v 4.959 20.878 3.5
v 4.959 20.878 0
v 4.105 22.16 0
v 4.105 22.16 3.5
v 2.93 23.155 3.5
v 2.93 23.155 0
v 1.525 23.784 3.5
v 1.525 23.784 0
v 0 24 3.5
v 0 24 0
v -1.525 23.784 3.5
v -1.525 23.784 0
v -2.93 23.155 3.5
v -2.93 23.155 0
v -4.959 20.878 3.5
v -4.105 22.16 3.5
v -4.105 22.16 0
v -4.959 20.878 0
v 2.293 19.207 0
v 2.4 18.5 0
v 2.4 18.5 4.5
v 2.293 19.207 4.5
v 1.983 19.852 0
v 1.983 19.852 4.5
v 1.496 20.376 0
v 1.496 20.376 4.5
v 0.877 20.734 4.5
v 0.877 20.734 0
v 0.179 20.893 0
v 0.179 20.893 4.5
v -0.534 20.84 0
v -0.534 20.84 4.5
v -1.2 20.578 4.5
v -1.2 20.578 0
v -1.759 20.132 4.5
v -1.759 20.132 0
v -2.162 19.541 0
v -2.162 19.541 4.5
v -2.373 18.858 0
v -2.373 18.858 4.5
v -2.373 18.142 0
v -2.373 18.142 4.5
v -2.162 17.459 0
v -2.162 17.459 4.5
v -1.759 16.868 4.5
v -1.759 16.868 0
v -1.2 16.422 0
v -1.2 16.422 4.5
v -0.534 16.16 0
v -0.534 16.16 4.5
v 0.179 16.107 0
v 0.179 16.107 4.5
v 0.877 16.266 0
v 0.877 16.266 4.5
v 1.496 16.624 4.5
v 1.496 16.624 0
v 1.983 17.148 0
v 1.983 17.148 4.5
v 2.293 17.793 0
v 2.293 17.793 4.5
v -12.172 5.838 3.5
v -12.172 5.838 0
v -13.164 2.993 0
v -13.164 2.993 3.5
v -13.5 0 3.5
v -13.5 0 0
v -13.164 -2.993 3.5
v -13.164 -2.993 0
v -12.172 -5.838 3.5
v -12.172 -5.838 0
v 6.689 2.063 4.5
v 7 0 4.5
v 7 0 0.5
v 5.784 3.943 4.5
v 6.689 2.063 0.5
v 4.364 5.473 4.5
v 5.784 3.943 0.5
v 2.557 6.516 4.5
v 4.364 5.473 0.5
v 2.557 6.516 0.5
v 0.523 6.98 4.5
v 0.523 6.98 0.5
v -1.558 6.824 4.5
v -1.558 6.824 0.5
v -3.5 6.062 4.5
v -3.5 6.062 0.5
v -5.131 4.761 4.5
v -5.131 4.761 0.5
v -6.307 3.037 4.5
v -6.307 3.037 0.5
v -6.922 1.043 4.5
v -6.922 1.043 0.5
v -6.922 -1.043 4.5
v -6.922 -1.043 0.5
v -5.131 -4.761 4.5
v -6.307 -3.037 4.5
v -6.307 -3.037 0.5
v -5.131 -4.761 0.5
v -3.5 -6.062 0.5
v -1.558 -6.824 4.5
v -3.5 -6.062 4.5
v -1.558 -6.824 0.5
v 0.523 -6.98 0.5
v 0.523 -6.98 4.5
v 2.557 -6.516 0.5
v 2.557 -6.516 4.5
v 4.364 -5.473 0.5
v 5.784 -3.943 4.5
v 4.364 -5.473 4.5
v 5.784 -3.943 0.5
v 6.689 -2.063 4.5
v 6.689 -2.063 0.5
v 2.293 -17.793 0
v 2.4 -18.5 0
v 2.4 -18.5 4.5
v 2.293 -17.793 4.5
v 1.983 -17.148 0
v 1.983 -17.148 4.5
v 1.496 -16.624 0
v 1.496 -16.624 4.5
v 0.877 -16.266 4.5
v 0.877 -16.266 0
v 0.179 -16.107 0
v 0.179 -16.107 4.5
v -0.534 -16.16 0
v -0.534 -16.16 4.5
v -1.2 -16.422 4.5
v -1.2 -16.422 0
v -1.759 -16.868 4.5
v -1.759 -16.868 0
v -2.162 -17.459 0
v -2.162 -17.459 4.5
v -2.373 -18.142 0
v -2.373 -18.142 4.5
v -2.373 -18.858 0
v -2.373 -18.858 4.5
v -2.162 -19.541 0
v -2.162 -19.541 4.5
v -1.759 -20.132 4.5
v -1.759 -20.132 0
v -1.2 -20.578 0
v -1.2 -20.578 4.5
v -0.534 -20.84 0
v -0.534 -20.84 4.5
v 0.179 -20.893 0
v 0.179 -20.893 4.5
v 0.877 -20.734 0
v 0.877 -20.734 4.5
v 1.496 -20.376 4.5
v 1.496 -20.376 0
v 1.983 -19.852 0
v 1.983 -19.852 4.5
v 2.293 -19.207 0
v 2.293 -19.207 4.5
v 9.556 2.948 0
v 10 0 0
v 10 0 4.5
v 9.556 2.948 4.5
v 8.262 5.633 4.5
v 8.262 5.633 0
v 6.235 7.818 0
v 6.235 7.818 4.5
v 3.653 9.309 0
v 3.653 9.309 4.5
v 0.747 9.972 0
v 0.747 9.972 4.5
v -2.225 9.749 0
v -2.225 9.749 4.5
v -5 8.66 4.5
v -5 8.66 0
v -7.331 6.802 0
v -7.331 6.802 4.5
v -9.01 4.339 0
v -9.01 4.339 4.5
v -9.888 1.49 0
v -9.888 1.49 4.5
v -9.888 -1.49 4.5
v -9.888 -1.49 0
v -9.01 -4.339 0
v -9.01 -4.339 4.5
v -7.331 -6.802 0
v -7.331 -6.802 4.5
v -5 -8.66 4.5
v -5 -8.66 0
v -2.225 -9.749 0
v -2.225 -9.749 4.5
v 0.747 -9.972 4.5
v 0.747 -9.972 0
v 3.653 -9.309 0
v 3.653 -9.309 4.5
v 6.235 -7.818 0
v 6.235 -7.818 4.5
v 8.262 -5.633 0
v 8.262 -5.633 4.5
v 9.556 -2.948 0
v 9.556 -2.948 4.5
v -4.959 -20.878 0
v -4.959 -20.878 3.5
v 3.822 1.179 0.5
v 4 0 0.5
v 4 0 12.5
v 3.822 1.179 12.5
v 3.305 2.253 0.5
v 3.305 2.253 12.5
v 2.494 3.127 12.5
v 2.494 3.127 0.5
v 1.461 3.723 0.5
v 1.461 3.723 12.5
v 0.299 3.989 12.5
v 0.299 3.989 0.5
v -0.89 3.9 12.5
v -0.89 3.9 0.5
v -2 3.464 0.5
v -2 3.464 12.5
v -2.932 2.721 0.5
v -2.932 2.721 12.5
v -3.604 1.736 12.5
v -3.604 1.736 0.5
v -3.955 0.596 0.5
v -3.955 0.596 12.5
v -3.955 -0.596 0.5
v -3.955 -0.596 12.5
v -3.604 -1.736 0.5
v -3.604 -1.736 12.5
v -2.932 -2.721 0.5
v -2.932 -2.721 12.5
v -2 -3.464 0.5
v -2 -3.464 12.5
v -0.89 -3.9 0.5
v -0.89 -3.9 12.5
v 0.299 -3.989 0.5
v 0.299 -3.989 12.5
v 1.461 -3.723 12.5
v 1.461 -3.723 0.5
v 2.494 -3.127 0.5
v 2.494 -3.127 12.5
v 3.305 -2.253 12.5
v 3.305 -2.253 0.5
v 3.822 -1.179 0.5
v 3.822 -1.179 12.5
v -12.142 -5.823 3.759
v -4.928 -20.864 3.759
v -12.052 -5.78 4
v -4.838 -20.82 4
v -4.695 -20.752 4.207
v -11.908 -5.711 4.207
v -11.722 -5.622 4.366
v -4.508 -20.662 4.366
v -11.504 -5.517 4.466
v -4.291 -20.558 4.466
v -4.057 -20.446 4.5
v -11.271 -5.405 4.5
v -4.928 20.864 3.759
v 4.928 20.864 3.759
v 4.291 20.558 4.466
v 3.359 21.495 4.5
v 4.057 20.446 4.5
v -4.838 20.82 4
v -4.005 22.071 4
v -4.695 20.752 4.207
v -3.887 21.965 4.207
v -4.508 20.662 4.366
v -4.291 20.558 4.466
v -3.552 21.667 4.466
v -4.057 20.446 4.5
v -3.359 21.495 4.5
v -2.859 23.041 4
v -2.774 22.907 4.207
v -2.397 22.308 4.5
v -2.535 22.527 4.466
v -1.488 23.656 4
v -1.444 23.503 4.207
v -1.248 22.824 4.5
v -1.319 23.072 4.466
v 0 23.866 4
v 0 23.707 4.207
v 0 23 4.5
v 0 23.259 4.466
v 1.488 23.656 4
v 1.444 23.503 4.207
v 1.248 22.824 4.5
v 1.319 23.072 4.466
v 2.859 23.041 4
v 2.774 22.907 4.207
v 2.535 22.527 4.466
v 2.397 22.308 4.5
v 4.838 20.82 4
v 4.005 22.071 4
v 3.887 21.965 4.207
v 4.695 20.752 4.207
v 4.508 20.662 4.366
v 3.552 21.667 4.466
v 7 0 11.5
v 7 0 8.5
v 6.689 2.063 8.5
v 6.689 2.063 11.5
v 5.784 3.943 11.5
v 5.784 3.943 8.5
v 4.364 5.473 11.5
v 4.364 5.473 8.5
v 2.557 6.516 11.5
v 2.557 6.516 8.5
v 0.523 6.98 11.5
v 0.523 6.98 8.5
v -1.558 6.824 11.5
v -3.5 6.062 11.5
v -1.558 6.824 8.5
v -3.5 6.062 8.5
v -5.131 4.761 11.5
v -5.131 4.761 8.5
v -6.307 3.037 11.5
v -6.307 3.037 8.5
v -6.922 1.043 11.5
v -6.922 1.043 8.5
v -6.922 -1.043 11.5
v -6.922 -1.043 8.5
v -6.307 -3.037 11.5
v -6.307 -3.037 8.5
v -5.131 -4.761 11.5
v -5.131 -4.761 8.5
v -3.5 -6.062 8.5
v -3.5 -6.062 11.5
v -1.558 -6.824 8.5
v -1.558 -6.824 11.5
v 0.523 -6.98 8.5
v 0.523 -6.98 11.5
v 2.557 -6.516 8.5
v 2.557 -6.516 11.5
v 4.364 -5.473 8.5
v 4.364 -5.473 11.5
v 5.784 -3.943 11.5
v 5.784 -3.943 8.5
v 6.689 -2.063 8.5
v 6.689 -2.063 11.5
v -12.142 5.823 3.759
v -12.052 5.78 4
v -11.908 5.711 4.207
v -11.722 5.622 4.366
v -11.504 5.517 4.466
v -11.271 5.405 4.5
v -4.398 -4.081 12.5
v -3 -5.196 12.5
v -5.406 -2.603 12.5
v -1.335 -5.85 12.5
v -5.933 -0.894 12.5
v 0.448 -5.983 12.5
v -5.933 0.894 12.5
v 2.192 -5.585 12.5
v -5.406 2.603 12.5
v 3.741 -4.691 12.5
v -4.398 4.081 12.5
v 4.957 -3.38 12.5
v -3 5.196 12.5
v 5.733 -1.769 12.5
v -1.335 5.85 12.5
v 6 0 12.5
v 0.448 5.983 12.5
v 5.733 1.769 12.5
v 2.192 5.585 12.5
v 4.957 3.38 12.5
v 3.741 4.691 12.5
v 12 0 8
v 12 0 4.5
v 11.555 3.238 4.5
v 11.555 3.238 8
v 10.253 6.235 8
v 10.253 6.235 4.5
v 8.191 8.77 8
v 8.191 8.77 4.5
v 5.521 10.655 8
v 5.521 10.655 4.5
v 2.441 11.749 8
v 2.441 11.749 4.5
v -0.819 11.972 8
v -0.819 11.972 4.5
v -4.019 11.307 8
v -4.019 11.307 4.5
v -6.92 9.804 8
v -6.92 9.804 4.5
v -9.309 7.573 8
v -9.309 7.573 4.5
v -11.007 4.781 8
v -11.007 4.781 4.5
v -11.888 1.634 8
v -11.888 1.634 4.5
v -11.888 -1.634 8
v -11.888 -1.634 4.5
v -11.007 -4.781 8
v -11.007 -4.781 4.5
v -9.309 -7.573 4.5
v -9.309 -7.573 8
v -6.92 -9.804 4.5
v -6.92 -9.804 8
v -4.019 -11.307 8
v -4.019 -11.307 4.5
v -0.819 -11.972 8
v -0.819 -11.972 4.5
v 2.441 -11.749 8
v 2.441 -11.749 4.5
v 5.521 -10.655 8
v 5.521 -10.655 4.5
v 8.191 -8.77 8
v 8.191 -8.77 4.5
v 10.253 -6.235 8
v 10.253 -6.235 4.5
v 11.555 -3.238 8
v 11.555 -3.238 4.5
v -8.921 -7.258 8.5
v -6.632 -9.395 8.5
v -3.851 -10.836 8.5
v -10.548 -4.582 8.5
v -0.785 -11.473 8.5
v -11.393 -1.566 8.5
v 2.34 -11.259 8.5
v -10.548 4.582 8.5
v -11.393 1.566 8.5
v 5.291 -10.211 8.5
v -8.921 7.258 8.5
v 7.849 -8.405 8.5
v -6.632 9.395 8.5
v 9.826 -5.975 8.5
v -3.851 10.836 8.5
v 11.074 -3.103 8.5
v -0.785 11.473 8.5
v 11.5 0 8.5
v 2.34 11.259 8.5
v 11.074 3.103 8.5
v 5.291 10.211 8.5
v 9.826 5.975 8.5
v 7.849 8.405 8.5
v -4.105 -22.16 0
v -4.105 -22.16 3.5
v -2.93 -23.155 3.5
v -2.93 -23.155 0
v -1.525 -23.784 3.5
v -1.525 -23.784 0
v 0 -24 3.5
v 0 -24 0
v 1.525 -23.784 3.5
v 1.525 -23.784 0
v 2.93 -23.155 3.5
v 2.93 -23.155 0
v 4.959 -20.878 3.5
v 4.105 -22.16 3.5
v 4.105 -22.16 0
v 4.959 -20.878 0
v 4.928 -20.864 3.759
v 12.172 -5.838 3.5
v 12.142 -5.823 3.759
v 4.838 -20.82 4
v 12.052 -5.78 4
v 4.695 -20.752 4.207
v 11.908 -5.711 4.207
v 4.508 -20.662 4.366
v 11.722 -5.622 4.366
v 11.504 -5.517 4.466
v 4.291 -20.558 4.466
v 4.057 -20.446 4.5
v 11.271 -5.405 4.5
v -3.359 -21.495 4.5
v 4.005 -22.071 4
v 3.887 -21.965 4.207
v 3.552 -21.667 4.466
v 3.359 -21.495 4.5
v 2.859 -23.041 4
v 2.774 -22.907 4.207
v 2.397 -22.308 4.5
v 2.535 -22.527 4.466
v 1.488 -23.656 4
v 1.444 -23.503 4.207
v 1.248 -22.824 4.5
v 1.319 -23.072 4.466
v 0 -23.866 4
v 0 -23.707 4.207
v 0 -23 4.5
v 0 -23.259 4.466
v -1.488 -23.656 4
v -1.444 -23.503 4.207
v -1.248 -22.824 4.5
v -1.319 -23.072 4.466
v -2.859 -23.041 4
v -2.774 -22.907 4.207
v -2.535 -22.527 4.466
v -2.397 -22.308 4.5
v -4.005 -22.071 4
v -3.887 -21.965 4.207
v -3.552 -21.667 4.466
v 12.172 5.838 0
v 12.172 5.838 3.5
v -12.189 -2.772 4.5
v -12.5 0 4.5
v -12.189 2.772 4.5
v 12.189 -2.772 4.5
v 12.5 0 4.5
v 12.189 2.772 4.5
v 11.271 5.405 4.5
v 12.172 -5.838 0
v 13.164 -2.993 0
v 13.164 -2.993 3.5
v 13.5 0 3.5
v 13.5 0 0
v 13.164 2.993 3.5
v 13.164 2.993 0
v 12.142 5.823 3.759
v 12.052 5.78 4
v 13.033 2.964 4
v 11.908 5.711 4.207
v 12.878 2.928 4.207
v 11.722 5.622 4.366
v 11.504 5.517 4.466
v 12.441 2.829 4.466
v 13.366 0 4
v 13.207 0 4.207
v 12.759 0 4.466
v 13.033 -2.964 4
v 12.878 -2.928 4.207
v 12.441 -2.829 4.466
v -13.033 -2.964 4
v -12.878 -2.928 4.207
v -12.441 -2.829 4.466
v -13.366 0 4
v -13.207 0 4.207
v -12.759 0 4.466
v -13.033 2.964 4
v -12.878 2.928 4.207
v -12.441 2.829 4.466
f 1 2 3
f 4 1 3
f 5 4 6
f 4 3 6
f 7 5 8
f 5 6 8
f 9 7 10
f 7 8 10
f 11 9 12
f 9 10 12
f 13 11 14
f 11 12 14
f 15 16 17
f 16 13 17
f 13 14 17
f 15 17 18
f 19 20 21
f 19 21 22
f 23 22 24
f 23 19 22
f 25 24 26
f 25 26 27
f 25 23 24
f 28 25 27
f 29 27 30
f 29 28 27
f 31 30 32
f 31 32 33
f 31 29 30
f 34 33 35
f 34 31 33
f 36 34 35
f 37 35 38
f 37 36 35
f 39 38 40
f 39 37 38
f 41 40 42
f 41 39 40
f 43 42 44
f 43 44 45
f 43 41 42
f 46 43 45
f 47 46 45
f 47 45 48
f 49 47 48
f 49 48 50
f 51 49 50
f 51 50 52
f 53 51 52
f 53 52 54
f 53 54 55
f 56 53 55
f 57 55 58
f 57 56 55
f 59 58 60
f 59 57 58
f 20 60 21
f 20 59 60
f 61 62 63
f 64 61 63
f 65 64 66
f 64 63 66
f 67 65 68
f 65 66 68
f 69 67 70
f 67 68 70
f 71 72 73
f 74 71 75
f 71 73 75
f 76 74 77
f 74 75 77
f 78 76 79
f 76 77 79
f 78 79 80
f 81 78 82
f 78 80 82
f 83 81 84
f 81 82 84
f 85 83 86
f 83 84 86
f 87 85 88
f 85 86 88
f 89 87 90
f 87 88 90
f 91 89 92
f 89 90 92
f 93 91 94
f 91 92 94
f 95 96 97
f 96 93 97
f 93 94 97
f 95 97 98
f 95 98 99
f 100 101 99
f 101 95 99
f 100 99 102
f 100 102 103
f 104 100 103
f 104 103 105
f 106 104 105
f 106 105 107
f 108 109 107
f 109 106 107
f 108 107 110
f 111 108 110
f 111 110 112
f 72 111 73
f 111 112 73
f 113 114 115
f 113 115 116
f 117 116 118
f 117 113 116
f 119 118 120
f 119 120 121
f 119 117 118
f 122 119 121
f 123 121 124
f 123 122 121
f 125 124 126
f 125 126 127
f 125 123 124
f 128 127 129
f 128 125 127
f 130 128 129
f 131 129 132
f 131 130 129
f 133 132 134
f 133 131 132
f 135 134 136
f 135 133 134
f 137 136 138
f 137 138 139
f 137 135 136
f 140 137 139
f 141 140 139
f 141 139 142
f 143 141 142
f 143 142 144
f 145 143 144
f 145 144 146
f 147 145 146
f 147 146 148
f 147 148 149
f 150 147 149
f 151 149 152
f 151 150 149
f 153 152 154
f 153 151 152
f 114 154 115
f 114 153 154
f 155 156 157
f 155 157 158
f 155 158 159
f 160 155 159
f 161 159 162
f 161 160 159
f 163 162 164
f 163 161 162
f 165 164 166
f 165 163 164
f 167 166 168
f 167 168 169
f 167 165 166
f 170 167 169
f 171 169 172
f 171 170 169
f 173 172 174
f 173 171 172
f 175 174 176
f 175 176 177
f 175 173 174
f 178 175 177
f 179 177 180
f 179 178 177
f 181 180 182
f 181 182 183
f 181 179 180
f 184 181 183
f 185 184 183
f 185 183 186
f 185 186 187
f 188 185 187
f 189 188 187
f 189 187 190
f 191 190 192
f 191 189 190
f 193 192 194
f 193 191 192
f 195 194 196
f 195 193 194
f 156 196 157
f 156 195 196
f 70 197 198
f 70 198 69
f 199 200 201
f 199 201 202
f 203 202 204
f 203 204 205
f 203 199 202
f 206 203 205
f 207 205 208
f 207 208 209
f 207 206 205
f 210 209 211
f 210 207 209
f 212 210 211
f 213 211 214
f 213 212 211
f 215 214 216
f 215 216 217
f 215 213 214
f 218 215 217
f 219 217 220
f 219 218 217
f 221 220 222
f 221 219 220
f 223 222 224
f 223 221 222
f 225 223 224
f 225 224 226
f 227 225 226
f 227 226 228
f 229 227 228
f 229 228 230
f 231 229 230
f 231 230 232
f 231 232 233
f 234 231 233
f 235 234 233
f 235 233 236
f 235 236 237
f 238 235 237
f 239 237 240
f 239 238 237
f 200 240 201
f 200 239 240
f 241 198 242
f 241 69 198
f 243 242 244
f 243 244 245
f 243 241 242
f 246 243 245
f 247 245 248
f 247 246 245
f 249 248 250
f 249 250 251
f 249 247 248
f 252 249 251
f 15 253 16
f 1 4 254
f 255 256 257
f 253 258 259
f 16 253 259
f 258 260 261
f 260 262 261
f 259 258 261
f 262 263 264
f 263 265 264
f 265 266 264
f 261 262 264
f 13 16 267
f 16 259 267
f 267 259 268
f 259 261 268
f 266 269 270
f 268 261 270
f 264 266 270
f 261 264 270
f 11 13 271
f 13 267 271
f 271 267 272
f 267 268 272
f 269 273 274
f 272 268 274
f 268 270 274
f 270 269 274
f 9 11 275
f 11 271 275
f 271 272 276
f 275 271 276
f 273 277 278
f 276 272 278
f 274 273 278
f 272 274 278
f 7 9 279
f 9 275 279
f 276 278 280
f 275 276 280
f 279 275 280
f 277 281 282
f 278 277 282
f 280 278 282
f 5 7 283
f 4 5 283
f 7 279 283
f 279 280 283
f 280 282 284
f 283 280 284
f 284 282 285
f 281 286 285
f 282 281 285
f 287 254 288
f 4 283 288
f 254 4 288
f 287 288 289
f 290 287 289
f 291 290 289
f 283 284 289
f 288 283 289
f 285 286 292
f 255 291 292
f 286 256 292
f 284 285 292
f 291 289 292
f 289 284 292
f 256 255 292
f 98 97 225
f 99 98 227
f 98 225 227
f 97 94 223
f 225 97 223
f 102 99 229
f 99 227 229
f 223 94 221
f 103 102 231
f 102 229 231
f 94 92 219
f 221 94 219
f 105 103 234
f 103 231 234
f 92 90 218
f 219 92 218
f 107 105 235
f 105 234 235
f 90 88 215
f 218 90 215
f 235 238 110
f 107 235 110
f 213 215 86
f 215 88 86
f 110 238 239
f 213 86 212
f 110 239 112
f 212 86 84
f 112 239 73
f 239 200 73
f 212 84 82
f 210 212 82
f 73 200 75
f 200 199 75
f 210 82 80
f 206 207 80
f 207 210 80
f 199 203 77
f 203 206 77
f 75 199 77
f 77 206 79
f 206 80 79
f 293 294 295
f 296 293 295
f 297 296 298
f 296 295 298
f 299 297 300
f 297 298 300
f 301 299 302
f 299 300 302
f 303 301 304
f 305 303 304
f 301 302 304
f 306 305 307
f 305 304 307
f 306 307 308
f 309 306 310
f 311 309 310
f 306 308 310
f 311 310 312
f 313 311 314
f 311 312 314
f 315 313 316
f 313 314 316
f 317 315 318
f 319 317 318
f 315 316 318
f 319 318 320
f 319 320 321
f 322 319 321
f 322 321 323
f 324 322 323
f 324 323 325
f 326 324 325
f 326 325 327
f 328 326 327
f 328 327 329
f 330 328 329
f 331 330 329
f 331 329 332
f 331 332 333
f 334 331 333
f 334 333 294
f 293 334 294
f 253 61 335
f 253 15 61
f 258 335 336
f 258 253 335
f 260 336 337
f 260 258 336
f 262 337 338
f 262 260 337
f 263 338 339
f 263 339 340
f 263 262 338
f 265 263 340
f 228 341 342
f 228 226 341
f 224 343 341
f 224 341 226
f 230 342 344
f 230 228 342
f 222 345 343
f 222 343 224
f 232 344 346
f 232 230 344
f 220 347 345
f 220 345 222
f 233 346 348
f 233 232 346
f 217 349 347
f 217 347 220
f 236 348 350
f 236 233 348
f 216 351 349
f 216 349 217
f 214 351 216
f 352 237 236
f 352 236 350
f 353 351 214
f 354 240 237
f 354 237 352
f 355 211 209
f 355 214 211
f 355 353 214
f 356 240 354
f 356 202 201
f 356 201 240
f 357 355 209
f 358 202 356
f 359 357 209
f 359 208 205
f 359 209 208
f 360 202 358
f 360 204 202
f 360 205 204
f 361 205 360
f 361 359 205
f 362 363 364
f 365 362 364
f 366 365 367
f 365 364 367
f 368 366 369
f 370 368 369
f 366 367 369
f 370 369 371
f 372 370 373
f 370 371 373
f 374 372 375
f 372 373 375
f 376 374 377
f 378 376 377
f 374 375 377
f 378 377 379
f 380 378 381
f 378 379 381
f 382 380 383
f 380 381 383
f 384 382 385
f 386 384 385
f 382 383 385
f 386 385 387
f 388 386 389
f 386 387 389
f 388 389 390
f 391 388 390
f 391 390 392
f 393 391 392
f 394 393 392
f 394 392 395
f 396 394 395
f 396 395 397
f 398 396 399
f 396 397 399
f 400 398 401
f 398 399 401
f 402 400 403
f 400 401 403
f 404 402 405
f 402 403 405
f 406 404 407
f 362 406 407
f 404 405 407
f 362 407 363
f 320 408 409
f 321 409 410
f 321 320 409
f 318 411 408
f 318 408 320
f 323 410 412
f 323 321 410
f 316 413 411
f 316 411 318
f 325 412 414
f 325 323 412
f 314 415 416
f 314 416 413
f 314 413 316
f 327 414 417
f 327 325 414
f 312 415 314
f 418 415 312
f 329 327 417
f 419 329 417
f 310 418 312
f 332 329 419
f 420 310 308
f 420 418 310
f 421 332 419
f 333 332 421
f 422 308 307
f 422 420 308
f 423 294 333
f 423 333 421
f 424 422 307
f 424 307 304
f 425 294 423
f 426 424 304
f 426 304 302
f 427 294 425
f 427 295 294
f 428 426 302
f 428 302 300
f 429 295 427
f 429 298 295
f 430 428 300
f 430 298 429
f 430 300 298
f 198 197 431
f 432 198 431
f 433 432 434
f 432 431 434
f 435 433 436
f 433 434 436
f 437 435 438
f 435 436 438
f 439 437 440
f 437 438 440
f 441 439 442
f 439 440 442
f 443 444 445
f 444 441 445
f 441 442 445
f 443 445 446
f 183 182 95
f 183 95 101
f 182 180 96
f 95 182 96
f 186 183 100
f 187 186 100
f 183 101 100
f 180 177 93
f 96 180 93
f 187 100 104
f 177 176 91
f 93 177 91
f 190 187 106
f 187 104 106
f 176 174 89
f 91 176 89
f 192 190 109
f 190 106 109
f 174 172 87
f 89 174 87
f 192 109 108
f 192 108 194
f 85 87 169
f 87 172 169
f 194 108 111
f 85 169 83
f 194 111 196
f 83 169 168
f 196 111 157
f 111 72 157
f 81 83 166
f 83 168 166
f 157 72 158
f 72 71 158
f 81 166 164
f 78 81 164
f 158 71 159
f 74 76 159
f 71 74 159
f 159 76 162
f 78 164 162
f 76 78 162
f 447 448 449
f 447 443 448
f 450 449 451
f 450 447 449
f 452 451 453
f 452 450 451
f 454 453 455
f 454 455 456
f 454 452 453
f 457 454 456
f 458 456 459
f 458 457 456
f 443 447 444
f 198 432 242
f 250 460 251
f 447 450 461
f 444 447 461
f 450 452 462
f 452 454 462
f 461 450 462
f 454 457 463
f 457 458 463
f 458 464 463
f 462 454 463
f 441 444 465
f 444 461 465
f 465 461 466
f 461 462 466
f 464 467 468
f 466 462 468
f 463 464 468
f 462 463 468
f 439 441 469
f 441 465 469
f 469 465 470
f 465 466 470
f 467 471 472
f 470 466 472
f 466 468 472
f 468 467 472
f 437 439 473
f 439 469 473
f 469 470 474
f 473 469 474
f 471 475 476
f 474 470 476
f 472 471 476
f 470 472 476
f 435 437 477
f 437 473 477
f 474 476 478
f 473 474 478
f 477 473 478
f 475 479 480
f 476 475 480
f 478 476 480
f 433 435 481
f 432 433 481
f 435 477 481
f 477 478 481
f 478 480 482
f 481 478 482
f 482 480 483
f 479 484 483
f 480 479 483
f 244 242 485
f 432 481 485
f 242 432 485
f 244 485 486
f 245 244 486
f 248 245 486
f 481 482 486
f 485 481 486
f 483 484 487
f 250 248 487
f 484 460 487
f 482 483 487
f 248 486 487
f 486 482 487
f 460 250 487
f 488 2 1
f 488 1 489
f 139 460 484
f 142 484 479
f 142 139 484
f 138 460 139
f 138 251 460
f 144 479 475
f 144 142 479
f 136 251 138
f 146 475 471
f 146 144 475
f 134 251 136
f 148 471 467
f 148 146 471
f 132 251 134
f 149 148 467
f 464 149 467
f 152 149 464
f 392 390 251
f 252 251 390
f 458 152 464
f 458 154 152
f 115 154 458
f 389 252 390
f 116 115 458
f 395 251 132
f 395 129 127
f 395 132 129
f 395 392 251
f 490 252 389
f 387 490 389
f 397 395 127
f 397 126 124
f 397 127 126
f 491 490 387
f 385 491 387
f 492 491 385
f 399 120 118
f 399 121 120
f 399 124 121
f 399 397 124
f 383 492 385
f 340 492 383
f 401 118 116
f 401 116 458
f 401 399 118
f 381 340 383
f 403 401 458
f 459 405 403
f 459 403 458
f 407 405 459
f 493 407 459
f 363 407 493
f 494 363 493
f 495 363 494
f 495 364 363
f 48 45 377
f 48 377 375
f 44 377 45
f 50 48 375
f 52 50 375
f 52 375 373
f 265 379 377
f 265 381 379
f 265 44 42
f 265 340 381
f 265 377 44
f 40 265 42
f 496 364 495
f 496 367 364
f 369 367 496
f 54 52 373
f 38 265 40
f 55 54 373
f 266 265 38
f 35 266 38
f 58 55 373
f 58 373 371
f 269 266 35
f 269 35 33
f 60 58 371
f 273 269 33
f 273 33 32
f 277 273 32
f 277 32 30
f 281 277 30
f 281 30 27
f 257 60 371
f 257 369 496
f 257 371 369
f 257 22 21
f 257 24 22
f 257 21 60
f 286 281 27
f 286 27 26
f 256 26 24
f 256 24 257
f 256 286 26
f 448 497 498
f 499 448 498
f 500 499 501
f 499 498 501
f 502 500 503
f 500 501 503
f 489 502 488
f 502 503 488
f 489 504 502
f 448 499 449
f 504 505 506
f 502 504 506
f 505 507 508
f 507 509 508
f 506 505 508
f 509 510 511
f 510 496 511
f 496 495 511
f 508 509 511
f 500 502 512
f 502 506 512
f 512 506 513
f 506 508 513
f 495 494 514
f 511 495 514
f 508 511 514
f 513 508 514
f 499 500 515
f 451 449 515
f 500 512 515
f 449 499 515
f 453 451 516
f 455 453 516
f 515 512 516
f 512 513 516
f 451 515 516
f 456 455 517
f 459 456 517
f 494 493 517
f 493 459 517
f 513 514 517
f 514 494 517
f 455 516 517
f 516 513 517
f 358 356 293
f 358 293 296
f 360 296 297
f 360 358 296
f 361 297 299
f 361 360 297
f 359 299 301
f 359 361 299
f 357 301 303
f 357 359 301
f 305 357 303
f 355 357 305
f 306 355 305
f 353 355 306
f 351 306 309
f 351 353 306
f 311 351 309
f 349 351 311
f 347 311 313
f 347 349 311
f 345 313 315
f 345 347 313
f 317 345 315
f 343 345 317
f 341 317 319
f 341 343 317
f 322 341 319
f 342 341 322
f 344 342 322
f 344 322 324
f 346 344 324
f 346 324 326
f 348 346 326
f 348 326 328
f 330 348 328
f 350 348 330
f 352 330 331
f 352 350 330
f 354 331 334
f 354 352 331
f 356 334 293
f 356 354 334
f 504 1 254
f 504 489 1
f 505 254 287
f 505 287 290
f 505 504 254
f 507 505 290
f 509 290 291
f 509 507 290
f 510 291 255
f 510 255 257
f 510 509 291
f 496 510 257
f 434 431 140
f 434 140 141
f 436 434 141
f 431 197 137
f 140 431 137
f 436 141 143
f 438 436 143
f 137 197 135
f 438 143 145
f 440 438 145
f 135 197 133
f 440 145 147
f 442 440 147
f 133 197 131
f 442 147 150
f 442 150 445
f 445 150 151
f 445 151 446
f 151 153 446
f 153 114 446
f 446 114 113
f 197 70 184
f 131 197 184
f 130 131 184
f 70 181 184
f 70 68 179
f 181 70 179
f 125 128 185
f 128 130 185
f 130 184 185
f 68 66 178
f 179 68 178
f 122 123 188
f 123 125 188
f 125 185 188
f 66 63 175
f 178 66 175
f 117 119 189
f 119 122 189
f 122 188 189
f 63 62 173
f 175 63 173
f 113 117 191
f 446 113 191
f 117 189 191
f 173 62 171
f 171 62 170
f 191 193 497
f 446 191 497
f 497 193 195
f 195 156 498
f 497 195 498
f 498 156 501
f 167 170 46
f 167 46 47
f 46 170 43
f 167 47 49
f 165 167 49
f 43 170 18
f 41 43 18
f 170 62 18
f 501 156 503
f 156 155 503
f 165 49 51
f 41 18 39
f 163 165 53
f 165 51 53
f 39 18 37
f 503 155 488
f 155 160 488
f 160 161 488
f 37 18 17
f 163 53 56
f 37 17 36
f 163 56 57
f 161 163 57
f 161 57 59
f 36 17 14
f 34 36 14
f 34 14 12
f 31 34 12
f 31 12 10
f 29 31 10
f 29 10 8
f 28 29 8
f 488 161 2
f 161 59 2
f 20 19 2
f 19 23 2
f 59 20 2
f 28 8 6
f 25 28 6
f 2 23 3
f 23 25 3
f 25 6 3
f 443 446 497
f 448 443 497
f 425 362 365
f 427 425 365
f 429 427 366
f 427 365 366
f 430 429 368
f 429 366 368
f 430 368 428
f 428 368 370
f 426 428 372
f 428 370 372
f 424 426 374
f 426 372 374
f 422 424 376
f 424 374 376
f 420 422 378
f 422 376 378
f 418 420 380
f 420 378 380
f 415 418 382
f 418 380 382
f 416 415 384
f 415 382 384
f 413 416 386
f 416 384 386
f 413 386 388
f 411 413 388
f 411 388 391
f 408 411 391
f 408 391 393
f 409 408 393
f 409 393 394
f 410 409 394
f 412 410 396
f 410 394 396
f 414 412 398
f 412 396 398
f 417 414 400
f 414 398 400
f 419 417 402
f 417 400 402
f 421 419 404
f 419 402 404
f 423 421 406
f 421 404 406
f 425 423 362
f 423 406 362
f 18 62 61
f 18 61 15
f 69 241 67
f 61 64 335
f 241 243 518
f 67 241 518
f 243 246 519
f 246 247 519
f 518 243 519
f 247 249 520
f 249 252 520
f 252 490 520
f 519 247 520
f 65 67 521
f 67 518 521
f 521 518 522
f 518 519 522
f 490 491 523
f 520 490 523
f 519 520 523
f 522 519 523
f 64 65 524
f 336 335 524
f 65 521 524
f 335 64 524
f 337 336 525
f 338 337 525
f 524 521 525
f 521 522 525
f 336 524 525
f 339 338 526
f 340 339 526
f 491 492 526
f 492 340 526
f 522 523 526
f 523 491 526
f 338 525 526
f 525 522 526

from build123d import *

# Parameters (mm, degrees)
SKETCH_R        = 2.4
SKETCH_R_2      = 10
PAD_DEPTH       = 4.5
SKETCH001_R     = 12
SKETCH001_R_2   = 6.1
PAD001_DEPTH    = 4
SKETCH002_R     = 7
SKETCH002_R_2   = 4
PAD002_DEPTH    = 12
FILLET_R        = 1
CHAMFER_SIZE    = 1
CHAMFER001_SIZE = 0.5


with BuildPart() as part:
    # Sketch → Pad (new body)
    with BuildSketch(Plane.XY):
        with BuildLine():
            ThreePointArc((12.172496, -5.837838), (13.5, 0), (12.172496, 5.837838))
            Line((4.959165, 20.878378), (12.172496, 5.837838))
            ThreePointArc((4.959165, 20.878378), (0, 24), (-4.959165, 20.878378))
            Line((-12.172496, 5.837838), (-4.959165, 20.878378))
            ThreePointArc((-12.172496, 5.837838), (-13.5, 0), (-12.172496, -5.837838))
            Line((-4.959165, -20.878378), (-12.172496, -5.837838))
            ThreePointArc((-4.959165, -20.878378), (0, -24), (4.959165, -20.878378))
            Line((4.959165, -20.878378), (12.172496, -5.837838))
        make_face()
        with Locations((0, 18.5)):
            Circle(SKETCH_R, mode=Mode.SUBTRACT)
        with Locations((0, -18.5)):
            Circle(SKETCH_R, mode=Mode.SUBTRACT)
        Circle(SKETCH_R_2, mode=Mode.SUBTRACT)
    extrude(amount=PAD_DEPTH)

    # Sketch001 (on Face13 of Pad) → Pad001 (join)
    with BuildSketch(Plane.XY.offset(4.5)):
        Circle(SKETCH001_R)
        Circle(SKETCH001_R_2, mode=Mode.SUBTRACT)
    extrude(amount=PAD001_DEPTH)

    # Sketch002 → Pad002 (join)
    with BuildSketch(Plane.XY.offset(0.5)):
        Circle(SKETCH002_R)
        Circle(SKETCH002_R_2, mode=Mode.SUBTRACT)
    extrude(amount=PAD002_DEPTH)

    # Fillet
    fillet_edges = [part.edges().sort_by_distance(p)[0] for p in [
        (-8.56583, -13.358108, 4.5),
        (-13.5, 0, 4.5),
        (-8.56583, 13.358108, 4.5),
        (0, 24, 4.5),
        (8.56583, 13.358108, 4.5),
        (8.56583, -13.358108, 4.5),
        (0, -24, 4.5),
        (13.5, 0, 4.5),
    ]]
    fillet(fillet_edges, radius=FILLET_R)

    # Chamfer
    chamfer_edges = [part.edges().sort_by_distance(p)[0] for p in [
        (-7, 0, 12.5),
    ]]
    chamfer(chamfer_edges, length=CHAMFER_SIZE)

    # Chamfer001
    chamfer001_edges = [part.edges().sort_by_distance(p)[0] for p in [
        (-12, 0, 8.5),
    ]]
    chamfer(chamfer001_edges, length=CHAMFER001_SIZE)


solid = part.part
